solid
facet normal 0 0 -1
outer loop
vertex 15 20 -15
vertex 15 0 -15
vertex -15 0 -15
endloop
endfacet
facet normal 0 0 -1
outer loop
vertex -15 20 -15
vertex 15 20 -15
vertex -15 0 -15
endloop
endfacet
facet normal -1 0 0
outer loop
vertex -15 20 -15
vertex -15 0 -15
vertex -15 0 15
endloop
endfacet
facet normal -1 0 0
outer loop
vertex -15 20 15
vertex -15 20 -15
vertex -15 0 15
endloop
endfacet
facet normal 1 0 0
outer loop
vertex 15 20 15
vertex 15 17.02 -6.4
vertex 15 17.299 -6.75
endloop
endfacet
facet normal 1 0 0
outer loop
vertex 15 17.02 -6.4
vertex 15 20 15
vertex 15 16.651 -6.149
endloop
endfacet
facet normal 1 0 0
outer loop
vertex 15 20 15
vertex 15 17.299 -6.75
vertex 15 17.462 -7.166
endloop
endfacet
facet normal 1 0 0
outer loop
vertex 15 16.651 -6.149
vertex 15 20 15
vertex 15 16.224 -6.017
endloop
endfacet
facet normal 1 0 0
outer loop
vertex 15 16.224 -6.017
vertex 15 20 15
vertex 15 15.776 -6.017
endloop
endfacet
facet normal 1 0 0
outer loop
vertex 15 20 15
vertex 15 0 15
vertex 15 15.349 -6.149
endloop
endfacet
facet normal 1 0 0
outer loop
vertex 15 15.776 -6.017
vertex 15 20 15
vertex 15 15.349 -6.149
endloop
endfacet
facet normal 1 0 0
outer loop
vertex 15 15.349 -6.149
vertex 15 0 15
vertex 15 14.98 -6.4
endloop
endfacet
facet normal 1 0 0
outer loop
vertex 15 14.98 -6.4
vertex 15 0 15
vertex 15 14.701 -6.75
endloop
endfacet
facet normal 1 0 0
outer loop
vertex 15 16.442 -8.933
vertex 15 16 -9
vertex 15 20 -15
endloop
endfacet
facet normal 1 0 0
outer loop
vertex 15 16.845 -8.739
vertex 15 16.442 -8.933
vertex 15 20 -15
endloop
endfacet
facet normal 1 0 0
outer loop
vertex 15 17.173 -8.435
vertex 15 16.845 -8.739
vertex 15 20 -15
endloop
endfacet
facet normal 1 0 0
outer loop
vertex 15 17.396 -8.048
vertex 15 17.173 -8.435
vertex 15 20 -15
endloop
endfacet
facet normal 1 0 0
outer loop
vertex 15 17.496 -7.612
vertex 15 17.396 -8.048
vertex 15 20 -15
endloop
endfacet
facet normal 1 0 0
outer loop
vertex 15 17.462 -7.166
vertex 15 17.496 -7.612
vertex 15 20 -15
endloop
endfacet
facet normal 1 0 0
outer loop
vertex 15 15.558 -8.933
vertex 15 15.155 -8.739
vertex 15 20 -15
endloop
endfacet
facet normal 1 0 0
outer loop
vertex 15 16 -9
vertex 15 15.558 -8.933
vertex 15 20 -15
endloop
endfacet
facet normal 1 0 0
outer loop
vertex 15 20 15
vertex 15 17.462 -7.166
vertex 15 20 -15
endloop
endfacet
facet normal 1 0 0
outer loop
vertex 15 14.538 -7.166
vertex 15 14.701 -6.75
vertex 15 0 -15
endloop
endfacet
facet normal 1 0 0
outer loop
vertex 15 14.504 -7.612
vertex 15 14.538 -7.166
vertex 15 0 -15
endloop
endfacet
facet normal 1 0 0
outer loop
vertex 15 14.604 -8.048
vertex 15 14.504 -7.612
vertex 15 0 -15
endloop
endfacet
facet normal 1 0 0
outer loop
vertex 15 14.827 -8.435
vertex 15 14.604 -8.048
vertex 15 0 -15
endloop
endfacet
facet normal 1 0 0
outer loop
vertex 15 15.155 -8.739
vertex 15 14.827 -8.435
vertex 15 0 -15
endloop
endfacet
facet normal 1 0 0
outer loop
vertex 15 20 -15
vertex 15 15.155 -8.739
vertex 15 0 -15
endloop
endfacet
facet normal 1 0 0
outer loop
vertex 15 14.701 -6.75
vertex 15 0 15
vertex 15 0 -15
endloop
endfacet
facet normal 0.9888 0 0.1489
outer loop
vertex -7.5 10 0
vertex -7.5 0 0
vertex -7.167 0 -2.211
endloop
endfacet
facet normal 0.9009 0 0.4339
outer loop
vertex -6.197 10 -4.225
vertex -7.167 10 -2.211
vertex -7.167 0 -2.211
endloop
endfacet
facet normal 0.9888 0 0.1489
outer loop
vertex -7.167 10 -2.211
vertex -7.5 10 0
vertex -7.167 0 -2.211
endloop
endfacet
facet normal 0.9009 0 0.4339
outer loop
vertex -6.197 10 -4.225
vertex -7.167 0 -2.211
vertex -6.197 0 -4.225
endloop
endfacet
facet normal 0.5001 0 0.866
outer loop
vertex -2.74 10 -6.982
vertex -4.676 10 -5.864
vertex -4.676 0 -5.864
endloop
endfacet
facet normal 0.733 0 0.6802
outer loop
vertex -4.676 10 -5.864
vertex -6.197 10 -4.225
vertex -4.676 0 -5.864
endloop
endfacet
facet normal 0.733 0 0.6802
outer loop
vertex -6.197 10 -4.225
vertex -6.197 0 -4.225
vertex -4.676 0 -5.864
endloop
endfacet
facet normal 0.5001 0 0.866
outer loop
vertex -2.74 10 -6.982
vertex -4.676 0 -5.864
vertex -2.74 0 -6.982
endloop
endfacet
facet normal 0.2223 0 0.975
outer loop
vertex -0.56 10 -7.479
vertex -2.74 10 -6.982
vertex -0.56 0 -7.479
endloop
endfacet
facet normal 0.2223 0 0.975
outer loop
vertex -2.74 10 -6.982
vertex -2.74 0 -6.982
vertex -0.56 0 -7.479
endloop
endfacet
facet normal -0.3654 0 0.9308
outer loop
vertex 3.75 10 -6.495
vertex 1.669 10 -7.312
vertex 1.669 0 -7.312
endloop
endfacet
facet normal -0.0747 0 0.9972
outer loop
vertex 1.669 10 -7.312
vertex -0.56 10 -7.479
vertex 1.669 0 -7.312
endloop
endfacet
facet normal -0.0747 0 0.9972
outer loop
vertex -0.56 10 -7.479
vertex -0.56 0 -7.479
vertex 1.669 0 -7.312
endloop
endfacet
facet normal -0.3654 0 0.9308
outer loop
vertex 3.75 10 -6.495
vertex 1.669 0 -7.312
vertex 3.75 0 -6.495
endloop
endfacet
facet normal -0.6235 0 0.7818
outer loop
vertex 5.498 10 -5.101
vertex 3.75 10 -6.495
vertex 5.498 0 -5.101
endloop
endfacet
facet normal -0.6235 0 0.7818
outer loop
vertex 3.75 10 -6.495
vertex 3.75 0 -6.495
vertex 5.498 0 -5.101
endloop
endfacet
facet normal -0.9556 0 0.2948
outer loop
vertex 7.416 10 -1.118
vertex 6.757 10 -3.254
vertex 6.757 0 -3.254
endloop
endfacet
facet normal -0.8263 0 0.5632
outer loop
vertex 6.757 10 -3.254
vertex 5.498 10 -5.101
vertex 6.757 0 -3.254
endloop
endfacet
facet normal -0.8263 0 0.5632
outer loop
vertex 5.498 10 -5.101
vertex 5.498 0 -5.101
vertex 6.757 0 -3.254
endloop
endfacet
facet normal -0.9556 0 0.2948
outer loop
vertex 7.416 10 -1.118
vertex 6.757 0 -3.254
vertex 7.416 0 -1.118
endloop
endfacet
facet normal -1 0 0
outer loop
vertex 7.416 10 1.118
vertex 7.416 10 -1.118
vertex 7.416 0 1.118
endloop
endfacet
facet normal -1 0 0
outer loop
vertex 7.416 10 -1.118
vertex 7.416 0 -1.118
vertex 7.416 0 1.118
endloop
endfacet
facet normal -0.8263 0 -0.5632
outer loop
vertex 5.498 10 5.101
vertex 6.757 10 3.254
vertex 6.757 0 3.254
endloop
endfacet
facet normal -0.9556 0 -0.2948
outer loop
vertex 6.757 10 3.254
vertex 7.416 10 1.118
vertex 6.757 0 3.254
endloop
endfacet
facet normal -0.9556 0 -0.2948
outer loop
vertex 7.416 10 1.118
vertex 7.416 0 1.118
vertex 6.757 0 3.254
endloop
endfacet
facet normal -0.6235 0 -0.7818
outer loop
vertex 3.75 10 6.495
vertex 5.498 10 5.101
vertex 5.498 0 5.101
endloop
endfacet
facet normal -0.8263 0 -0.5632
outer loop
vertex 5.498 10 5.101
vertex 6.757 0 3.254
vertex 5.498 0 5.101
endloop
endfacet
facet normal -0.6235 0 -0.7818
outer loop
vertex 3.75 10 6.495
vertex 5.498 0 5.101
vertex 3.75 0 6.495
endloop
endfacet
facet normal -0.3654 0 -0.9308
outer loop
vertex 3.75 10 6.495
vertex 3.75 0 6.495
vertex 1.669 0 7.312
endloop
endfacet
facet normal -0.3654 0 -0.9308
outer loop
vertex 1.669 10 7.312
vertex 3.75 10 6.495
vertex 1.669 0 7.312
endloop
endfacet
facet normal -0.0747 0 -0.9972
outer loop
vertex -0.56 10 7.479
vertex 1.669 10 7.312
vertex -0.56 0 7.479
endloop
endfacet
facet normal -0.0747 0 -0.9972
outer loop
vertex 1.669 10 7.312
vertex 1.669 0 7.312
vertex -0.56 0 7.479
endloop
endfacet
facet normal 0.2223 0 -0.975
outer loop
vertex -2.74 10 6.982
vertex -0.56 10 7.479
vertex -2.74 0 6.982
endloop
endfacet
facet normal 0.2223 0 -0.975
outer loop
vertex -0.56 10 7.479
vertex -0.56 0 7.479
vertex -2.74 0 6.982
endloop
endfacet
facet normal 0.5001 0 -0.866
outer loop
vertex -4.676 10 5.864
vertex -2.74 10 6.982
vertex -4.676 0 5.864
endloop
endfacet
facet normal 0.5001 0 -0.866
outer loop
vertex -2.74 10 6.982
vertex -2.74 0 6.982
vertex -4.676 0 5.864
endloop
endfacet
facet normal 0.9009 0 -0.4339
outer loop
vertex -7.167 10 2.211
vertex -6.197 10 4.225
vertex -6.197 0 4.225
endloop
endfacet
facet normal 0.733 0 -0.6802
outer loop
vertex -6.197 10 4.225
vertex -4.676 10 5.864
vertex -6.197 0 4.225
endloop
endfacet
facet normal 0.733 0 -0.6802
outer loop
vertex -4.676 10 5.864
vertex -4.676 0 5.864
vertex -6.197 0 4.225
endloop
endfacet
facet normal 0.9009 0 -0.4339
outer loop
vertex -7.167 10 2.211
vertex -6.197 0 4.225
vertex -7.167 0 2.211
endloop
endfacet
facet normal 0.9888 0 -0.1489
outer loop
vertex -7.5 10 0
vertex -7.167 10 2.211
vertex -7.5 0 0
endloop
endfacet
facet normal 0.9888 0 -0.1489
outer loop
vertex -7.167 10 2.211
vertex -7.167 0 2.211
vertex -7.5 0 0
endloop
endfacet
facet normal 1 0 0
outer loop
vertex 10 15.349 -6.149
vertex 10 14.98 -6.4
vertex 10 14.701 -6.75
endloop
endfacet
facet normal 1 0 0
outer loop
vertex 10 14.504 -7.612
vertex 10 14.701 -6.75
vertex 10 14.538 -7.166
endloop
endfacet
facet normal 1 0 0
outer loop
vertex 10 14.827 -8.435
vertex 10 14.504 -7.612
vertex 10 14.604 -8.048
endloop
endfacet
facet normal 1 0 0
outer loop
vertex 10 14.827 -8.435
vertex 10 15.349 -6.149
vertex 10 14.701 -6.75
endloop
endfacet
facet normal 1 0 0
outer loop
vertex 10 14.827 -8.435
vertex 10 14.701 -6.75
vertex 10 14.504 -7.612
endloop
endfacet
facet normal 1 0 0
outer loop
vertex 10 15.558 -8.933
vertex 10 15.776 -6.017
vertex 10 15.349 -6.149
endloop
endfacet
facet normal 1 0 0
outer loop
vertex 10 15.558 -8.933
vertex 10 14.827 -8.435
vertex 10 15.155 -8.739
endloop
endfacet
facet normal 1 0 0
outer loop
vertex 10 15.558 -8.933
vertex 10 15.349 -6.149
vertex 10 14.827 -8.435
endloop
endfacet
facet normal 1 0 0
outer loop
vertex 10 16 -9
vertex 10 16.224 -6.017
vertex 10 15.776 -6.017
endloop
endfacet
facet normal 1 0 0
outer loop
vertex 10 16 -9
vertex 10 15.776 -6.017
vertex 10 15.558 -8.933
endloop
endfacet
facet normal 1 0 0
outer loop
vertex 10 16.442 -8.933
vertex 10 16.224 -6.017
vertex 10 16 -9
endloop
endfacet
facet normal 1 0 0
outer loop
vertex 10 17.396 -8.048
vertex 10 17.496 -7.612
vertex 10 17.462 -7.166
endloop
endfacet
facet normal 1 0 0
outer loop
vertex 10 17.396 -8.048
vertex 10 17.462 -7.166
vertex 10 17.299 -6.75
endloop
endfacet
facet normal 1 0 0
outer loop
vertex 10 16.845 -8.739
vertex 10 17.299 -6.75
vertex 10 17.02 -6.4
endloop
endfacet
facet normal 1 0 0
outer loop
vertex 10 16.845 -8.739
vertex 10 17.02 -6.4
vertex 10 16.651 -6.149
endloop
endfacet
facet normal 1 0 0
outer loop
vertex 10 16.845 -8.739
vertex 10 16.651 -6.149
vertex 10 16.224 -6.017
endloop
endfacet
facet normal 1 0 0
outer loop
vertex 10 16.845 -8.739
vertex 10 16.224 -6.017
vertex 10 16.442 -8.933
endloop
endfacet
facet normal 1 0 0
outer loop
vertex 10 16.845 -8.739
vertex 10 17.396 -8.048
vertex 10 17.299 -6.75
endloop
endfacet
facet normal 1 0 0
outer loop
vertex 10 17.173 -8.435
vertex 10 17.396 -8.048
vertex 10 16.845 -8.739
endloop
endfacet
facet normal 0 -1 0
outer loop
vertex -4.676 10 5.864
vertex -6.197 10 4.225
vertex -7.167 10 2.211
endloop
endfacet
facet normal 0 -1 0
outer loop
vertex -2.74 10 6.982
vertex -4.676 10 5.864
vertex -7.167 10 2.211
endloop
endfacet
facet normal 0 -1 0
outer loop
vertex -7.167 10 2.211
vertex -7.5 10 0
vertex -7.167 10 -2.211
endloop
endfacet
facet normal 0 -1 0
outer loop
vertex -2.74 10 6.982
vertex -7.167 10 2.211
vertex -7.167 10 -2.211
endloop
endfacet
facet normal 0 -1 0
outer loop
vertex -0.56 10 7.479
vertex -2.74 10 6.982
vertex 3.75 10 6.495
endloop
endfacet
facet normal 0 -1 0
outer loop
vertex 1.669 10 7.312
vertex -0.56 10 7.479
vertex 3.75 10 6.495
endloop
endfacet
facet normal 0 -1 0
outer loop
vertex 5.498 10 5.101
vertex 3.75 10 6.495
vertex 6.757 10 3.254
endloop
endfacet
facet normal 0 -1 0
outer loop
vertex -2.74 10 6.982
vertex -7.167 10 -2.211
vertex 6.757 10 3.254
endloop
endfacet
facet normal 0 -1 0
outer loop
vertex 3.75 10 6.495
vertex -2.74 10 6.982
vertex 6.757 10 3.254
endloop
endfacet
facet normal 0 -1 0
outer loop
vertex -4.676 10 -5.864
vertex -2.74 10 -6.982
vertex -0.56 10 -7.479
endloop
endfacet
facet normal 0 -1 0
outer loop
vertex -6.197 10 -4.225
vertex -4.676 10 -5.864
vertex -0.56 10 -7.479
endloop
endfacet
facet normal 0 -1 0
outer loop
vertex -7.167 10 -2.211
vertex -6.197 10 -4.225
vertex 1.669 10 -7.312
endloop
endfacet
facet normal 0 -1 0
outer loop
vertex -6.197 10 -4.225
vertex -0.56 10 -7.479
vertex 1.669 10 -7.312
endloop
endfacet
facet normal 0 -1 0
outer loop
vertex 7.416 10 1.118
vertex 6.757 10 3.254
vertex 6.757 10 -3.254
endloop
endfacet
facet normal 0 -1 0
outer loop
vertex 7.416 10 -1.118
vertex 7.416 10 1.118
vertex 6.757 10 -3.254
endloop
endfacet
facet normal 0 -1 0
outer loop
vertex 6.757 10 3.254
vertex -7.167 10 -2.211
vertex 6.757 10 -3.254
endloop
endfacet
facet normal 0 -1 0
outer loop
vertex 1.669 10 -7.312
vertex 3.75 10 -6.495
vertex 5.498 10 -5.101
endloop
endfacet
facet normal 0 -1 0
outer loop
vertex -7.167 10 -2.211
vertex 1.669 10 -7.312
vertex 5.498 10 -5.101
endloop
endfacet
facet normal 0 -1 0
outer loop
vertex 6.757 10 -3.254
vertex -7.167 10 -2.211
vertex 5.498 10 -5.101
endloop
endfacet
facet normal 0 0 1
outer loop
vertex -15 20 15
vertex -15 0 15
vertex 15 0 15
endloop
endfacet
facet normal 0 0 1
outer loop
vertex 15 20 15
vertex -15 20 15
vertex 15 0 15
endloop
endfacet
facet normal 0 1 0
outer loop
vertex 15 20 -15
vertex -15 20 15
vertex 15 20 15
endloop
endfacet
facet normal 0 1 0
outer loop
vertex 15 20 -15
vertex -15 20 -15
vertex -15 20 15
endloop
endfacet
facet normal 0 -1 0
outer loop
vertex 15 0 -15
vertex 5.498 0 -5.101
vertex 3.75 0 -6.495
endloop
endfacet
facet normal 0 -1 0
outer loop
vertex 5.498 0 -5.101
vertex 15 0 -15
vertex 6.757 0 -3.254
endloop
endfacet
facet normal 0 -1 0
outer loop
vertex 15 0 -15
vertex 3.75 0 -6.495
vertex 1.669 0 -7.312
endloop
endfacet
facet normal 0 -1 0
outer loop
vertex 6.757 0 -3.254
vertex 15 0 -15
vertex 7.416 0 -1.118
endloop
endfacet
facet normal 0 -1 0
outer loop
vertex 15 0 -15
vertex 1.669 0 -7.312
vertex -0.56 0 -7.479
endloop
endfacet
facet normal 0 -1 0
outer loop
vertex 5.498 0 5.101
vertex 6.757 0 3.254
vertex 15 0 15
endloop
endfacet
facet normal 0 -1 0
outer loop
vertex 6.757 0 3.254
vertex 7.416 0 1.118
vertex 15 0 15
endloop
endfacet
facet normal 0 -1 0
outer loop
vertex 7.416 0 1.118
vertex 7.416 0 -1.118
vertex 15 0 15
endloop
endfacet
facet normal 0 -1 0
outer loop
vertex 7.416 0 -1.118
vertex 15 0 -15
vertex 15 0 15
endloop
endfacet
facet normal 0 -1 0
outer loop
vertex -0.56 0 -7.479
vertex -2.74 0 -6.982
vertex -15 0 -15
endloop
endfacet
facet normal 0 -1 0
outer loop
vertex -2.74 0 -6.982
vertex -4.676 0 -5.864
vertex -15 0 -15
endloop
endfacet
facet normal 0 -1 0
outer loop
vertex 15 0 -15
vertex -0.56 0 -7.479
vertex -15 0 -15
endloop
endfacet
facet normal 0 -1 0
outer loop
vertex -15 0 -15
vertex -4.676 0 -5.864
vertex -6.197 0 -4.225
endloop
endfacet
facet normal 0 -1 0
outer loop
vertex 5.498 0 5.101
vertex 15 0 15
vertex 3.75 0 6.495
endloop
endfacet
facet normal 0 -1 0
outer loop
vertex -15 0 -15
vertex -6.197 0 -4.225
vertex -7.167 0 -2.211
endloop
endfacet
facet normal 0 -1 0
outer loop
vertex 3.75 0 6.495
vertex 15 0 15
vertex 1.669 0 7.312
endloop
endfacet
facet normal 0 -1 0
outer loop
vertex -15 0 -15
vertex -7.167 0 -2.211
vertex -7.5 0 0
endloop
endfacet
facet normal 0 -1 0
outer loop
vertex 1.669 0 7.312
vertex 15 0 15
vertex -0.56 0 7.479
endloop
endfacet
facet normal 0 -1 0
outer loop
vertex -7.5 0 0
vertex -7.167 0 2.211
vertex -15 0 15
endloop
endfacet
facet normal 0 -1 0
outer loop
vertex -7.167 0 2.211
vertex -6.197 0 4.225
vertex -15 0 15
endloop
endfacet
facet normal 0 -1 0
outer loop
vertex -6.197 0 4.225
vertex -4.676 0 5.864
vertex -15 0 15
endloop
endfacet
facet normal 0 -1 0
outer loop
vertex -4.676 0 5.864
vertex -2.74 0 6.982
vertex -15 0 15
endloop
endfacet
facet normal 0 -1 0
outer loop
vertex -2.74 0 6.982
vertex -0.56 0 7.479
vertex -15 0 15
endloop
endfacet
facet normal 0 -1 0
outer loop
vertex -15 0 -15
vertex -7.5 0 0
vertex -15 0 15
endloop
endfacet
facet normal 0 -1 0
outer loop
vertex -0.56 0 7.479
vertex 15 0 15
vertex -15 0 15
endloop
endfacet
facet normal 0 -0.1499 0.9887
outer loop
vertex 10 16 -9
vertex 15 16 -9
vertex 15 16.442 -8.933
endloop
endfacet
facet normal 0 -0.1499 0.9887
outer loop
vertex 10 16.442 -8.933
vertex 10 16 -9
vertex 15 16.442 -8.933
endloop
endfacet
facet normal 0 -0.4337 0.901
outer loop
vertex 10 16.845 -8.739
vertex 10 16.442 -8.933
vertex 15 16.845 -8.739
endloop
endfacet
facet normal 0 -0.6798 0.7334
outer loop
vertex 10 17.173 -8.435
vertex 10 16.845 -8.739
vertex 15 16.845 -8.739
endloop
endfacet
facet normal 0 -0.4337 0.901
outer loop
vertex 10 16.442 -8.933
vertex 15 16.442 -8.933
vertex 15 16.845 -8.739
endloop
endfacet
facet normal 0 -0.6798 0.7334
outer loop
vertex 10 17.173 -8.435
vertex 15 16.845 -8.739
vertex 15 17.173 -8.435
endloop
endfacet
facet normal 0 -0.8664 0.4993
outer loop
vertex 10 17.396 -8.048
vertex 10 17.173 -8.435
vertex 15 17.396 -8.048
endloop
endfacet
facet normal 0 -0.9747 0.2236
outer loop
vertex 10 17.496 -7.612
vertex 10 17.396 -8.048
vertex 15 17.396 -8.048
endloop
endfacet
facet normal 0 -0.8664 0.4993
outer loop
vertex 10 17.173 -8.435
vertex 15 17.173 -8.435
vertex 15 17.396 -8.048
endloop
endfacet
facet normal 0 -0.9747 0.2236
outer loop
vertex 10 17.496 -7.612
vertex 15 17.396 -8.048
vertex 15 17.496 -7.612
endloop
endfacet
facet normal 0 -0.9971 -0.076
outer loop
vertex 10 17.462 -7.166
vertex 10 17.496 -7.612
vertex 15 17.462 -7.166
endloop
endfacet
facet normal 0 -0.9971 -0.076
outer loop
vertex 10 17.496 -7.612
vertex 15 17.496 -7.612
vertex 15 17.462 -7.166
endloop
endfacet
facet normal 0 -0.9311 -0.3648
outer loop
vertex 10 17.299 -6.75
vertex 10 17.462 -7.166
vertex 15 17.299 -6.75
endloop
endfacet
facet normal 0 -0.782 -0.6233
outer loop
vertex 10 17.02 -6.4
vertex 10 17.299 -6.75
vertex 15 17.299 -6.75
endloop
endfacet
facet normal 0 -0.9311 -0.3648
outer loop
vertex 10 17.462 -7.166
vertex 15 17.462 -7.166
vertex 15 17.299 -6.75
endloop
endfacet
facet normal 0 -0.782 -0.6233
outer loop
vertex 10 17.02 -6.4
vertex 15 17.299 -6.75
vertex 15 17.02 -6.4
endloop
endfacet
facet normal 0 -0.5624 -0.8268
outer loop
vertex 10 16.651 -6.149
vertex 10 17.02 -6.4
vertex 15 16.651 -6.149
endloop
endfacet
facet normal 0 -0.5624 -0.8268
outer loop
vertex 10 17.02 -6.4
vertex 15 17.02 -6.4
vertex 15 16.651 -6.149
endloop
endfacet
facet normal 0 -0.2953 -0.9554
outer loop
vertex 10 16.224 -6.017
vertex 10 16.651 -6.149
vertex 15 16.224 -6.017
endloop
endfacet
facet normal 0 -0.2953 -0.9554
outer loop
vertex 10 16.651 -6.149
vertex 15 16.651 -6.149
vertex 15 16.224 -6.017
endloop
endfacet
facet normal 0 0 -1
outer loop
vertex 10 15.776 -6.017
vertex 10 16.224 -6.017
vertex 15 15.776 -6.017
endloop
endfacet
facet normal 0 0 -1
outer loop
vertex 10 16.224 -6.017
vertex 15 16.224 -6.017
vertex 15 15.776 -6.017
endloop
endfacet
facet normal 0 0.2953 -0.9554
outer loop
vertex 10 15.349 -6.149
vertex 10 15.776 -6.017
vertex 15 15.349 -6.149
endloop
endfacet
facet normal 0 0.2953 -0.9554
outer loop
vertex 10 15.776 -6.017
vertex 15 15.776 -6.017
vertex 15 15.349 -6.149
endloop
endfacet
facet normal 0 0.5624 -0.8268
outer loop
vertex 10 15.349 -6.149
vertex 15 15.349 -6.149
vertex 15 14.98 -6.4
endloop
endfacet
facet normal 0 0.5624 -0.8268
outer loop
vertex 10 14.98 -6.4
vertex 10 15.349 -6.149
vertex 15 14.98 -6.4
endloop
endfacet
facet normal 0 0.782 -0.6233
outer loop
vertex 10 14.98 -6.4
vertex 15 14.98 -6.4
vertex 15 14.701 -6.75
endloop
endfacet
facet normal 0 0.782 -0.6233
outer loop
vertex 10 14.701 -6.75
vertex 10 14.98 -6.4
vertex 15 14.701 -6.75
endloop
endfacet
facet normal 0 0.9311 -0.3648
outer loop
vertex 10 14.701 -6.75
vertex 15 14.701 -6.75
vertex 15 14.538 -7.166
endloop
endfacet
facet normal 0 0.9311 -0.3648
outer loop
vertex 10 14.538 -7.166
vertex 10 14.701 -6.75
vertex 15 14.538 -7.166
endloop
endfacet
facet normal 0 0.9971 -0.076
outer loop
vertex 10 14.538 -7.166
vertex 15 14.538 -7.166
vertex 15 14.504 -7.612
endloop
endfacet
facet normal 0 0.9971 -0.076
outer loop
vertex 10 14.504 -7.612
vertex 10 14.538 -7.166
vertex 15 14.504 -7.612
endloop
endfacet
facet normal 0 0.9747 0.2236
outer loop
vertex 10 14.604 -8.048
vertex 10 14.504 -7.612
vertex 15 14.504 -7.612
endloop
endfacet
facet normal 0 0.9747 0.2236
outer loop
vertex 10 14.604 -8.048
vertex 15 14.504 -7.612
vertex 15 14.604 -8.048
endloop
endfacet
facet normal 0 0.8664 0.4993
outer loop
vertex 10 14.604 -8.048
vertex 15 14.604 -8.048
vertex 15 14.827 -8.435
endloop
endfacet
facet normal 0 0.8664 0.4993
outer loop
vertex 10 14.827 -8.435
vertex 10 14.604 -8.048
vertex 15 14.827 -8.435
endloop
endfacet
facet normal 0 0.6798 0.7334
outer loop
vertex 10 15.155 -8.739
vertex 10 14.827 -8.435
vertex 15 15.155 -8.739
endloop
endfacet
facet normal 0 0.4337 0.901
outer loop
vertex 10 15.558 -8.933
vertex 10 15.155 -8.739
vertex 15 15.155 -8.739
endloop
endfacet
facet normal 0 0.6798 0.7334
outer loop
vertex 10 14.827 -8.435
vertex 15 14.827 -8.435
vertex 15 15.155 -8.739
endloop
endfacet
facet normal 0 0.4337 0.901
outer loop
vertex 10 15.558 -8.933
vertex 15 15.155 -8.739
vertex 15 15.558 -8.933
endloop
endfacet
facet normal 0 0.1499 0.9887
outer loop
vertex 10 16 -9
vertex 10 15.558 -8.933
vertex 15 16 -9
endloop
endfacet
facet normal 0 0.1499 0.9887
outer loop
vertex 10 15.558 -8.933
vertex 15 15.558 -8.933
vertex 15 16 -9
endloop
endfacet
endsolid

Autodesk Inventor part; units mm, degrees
ref_plane "YZ Plane" through (0, 0, 0) normal (1, 0, 0) x (0, 1, 0)
ref_plane "XZ Plane" through (0, 0, 0) normal (0, 1, 0) x (-1, 0, 0)
ref_plane "XY Plane" through (0, 0, 0) normal (0, 0, 1) x (1, 0, 0)
sketch "Sketch1" plane through (0, 0, 0) normal (0, 1, 0) x (-1, 0, 0)
  circle A0 centre (0, 0) radius 7.5
  line L0 (15, 15) -> (-15, 15)
  line L1 (-15, 15) -> (-15, -15)
  line L2 (-15, -15) -> (15, -15)
  line L3 (15, -15) -> (15, 15)
  dimension "d0" = 15
  dimension "d1" = 30
  dimension "d2" = 30
  dimension "d3" = 15
  dimension "d4" = 15
extrude "Extrusion1" add sketch "Sketch1" along normal blind 10
sketch "Sketch2" plane through (0, 10, 0) normal (0, 1, 0) x (1, 0, 0)
  line L0 (-15, -15) -> (15, -15)
  line L1 (15, -15) -> (15, 15)
  line L2 (15, 15) -> (-15, 15)
  line L3 (-15, 15) -> (-15, -15)
  point P0 (0, 0)
extrude "Extrusion2" add sketch "Sketch2" along normal blind 10
sketch "Sketch3" plane through (15, 0, 15) normal (1, 0, 0) x (0, 0, -1)
  line L0 (15, 0) -> (30, 0)
  line L1 (22.5, 10) -> (22.5, 0) projected
  line L2 (22.5, 0) -> (22.5, 7)
  circle A0 centre (22.5, 16) radius 1.5
  dimension "d9" = 16
  dimension "d10" = 3
extrude "Extrusion3" cut sketch "Sketch3" against normal blind 5
properties part number "bruh2"
